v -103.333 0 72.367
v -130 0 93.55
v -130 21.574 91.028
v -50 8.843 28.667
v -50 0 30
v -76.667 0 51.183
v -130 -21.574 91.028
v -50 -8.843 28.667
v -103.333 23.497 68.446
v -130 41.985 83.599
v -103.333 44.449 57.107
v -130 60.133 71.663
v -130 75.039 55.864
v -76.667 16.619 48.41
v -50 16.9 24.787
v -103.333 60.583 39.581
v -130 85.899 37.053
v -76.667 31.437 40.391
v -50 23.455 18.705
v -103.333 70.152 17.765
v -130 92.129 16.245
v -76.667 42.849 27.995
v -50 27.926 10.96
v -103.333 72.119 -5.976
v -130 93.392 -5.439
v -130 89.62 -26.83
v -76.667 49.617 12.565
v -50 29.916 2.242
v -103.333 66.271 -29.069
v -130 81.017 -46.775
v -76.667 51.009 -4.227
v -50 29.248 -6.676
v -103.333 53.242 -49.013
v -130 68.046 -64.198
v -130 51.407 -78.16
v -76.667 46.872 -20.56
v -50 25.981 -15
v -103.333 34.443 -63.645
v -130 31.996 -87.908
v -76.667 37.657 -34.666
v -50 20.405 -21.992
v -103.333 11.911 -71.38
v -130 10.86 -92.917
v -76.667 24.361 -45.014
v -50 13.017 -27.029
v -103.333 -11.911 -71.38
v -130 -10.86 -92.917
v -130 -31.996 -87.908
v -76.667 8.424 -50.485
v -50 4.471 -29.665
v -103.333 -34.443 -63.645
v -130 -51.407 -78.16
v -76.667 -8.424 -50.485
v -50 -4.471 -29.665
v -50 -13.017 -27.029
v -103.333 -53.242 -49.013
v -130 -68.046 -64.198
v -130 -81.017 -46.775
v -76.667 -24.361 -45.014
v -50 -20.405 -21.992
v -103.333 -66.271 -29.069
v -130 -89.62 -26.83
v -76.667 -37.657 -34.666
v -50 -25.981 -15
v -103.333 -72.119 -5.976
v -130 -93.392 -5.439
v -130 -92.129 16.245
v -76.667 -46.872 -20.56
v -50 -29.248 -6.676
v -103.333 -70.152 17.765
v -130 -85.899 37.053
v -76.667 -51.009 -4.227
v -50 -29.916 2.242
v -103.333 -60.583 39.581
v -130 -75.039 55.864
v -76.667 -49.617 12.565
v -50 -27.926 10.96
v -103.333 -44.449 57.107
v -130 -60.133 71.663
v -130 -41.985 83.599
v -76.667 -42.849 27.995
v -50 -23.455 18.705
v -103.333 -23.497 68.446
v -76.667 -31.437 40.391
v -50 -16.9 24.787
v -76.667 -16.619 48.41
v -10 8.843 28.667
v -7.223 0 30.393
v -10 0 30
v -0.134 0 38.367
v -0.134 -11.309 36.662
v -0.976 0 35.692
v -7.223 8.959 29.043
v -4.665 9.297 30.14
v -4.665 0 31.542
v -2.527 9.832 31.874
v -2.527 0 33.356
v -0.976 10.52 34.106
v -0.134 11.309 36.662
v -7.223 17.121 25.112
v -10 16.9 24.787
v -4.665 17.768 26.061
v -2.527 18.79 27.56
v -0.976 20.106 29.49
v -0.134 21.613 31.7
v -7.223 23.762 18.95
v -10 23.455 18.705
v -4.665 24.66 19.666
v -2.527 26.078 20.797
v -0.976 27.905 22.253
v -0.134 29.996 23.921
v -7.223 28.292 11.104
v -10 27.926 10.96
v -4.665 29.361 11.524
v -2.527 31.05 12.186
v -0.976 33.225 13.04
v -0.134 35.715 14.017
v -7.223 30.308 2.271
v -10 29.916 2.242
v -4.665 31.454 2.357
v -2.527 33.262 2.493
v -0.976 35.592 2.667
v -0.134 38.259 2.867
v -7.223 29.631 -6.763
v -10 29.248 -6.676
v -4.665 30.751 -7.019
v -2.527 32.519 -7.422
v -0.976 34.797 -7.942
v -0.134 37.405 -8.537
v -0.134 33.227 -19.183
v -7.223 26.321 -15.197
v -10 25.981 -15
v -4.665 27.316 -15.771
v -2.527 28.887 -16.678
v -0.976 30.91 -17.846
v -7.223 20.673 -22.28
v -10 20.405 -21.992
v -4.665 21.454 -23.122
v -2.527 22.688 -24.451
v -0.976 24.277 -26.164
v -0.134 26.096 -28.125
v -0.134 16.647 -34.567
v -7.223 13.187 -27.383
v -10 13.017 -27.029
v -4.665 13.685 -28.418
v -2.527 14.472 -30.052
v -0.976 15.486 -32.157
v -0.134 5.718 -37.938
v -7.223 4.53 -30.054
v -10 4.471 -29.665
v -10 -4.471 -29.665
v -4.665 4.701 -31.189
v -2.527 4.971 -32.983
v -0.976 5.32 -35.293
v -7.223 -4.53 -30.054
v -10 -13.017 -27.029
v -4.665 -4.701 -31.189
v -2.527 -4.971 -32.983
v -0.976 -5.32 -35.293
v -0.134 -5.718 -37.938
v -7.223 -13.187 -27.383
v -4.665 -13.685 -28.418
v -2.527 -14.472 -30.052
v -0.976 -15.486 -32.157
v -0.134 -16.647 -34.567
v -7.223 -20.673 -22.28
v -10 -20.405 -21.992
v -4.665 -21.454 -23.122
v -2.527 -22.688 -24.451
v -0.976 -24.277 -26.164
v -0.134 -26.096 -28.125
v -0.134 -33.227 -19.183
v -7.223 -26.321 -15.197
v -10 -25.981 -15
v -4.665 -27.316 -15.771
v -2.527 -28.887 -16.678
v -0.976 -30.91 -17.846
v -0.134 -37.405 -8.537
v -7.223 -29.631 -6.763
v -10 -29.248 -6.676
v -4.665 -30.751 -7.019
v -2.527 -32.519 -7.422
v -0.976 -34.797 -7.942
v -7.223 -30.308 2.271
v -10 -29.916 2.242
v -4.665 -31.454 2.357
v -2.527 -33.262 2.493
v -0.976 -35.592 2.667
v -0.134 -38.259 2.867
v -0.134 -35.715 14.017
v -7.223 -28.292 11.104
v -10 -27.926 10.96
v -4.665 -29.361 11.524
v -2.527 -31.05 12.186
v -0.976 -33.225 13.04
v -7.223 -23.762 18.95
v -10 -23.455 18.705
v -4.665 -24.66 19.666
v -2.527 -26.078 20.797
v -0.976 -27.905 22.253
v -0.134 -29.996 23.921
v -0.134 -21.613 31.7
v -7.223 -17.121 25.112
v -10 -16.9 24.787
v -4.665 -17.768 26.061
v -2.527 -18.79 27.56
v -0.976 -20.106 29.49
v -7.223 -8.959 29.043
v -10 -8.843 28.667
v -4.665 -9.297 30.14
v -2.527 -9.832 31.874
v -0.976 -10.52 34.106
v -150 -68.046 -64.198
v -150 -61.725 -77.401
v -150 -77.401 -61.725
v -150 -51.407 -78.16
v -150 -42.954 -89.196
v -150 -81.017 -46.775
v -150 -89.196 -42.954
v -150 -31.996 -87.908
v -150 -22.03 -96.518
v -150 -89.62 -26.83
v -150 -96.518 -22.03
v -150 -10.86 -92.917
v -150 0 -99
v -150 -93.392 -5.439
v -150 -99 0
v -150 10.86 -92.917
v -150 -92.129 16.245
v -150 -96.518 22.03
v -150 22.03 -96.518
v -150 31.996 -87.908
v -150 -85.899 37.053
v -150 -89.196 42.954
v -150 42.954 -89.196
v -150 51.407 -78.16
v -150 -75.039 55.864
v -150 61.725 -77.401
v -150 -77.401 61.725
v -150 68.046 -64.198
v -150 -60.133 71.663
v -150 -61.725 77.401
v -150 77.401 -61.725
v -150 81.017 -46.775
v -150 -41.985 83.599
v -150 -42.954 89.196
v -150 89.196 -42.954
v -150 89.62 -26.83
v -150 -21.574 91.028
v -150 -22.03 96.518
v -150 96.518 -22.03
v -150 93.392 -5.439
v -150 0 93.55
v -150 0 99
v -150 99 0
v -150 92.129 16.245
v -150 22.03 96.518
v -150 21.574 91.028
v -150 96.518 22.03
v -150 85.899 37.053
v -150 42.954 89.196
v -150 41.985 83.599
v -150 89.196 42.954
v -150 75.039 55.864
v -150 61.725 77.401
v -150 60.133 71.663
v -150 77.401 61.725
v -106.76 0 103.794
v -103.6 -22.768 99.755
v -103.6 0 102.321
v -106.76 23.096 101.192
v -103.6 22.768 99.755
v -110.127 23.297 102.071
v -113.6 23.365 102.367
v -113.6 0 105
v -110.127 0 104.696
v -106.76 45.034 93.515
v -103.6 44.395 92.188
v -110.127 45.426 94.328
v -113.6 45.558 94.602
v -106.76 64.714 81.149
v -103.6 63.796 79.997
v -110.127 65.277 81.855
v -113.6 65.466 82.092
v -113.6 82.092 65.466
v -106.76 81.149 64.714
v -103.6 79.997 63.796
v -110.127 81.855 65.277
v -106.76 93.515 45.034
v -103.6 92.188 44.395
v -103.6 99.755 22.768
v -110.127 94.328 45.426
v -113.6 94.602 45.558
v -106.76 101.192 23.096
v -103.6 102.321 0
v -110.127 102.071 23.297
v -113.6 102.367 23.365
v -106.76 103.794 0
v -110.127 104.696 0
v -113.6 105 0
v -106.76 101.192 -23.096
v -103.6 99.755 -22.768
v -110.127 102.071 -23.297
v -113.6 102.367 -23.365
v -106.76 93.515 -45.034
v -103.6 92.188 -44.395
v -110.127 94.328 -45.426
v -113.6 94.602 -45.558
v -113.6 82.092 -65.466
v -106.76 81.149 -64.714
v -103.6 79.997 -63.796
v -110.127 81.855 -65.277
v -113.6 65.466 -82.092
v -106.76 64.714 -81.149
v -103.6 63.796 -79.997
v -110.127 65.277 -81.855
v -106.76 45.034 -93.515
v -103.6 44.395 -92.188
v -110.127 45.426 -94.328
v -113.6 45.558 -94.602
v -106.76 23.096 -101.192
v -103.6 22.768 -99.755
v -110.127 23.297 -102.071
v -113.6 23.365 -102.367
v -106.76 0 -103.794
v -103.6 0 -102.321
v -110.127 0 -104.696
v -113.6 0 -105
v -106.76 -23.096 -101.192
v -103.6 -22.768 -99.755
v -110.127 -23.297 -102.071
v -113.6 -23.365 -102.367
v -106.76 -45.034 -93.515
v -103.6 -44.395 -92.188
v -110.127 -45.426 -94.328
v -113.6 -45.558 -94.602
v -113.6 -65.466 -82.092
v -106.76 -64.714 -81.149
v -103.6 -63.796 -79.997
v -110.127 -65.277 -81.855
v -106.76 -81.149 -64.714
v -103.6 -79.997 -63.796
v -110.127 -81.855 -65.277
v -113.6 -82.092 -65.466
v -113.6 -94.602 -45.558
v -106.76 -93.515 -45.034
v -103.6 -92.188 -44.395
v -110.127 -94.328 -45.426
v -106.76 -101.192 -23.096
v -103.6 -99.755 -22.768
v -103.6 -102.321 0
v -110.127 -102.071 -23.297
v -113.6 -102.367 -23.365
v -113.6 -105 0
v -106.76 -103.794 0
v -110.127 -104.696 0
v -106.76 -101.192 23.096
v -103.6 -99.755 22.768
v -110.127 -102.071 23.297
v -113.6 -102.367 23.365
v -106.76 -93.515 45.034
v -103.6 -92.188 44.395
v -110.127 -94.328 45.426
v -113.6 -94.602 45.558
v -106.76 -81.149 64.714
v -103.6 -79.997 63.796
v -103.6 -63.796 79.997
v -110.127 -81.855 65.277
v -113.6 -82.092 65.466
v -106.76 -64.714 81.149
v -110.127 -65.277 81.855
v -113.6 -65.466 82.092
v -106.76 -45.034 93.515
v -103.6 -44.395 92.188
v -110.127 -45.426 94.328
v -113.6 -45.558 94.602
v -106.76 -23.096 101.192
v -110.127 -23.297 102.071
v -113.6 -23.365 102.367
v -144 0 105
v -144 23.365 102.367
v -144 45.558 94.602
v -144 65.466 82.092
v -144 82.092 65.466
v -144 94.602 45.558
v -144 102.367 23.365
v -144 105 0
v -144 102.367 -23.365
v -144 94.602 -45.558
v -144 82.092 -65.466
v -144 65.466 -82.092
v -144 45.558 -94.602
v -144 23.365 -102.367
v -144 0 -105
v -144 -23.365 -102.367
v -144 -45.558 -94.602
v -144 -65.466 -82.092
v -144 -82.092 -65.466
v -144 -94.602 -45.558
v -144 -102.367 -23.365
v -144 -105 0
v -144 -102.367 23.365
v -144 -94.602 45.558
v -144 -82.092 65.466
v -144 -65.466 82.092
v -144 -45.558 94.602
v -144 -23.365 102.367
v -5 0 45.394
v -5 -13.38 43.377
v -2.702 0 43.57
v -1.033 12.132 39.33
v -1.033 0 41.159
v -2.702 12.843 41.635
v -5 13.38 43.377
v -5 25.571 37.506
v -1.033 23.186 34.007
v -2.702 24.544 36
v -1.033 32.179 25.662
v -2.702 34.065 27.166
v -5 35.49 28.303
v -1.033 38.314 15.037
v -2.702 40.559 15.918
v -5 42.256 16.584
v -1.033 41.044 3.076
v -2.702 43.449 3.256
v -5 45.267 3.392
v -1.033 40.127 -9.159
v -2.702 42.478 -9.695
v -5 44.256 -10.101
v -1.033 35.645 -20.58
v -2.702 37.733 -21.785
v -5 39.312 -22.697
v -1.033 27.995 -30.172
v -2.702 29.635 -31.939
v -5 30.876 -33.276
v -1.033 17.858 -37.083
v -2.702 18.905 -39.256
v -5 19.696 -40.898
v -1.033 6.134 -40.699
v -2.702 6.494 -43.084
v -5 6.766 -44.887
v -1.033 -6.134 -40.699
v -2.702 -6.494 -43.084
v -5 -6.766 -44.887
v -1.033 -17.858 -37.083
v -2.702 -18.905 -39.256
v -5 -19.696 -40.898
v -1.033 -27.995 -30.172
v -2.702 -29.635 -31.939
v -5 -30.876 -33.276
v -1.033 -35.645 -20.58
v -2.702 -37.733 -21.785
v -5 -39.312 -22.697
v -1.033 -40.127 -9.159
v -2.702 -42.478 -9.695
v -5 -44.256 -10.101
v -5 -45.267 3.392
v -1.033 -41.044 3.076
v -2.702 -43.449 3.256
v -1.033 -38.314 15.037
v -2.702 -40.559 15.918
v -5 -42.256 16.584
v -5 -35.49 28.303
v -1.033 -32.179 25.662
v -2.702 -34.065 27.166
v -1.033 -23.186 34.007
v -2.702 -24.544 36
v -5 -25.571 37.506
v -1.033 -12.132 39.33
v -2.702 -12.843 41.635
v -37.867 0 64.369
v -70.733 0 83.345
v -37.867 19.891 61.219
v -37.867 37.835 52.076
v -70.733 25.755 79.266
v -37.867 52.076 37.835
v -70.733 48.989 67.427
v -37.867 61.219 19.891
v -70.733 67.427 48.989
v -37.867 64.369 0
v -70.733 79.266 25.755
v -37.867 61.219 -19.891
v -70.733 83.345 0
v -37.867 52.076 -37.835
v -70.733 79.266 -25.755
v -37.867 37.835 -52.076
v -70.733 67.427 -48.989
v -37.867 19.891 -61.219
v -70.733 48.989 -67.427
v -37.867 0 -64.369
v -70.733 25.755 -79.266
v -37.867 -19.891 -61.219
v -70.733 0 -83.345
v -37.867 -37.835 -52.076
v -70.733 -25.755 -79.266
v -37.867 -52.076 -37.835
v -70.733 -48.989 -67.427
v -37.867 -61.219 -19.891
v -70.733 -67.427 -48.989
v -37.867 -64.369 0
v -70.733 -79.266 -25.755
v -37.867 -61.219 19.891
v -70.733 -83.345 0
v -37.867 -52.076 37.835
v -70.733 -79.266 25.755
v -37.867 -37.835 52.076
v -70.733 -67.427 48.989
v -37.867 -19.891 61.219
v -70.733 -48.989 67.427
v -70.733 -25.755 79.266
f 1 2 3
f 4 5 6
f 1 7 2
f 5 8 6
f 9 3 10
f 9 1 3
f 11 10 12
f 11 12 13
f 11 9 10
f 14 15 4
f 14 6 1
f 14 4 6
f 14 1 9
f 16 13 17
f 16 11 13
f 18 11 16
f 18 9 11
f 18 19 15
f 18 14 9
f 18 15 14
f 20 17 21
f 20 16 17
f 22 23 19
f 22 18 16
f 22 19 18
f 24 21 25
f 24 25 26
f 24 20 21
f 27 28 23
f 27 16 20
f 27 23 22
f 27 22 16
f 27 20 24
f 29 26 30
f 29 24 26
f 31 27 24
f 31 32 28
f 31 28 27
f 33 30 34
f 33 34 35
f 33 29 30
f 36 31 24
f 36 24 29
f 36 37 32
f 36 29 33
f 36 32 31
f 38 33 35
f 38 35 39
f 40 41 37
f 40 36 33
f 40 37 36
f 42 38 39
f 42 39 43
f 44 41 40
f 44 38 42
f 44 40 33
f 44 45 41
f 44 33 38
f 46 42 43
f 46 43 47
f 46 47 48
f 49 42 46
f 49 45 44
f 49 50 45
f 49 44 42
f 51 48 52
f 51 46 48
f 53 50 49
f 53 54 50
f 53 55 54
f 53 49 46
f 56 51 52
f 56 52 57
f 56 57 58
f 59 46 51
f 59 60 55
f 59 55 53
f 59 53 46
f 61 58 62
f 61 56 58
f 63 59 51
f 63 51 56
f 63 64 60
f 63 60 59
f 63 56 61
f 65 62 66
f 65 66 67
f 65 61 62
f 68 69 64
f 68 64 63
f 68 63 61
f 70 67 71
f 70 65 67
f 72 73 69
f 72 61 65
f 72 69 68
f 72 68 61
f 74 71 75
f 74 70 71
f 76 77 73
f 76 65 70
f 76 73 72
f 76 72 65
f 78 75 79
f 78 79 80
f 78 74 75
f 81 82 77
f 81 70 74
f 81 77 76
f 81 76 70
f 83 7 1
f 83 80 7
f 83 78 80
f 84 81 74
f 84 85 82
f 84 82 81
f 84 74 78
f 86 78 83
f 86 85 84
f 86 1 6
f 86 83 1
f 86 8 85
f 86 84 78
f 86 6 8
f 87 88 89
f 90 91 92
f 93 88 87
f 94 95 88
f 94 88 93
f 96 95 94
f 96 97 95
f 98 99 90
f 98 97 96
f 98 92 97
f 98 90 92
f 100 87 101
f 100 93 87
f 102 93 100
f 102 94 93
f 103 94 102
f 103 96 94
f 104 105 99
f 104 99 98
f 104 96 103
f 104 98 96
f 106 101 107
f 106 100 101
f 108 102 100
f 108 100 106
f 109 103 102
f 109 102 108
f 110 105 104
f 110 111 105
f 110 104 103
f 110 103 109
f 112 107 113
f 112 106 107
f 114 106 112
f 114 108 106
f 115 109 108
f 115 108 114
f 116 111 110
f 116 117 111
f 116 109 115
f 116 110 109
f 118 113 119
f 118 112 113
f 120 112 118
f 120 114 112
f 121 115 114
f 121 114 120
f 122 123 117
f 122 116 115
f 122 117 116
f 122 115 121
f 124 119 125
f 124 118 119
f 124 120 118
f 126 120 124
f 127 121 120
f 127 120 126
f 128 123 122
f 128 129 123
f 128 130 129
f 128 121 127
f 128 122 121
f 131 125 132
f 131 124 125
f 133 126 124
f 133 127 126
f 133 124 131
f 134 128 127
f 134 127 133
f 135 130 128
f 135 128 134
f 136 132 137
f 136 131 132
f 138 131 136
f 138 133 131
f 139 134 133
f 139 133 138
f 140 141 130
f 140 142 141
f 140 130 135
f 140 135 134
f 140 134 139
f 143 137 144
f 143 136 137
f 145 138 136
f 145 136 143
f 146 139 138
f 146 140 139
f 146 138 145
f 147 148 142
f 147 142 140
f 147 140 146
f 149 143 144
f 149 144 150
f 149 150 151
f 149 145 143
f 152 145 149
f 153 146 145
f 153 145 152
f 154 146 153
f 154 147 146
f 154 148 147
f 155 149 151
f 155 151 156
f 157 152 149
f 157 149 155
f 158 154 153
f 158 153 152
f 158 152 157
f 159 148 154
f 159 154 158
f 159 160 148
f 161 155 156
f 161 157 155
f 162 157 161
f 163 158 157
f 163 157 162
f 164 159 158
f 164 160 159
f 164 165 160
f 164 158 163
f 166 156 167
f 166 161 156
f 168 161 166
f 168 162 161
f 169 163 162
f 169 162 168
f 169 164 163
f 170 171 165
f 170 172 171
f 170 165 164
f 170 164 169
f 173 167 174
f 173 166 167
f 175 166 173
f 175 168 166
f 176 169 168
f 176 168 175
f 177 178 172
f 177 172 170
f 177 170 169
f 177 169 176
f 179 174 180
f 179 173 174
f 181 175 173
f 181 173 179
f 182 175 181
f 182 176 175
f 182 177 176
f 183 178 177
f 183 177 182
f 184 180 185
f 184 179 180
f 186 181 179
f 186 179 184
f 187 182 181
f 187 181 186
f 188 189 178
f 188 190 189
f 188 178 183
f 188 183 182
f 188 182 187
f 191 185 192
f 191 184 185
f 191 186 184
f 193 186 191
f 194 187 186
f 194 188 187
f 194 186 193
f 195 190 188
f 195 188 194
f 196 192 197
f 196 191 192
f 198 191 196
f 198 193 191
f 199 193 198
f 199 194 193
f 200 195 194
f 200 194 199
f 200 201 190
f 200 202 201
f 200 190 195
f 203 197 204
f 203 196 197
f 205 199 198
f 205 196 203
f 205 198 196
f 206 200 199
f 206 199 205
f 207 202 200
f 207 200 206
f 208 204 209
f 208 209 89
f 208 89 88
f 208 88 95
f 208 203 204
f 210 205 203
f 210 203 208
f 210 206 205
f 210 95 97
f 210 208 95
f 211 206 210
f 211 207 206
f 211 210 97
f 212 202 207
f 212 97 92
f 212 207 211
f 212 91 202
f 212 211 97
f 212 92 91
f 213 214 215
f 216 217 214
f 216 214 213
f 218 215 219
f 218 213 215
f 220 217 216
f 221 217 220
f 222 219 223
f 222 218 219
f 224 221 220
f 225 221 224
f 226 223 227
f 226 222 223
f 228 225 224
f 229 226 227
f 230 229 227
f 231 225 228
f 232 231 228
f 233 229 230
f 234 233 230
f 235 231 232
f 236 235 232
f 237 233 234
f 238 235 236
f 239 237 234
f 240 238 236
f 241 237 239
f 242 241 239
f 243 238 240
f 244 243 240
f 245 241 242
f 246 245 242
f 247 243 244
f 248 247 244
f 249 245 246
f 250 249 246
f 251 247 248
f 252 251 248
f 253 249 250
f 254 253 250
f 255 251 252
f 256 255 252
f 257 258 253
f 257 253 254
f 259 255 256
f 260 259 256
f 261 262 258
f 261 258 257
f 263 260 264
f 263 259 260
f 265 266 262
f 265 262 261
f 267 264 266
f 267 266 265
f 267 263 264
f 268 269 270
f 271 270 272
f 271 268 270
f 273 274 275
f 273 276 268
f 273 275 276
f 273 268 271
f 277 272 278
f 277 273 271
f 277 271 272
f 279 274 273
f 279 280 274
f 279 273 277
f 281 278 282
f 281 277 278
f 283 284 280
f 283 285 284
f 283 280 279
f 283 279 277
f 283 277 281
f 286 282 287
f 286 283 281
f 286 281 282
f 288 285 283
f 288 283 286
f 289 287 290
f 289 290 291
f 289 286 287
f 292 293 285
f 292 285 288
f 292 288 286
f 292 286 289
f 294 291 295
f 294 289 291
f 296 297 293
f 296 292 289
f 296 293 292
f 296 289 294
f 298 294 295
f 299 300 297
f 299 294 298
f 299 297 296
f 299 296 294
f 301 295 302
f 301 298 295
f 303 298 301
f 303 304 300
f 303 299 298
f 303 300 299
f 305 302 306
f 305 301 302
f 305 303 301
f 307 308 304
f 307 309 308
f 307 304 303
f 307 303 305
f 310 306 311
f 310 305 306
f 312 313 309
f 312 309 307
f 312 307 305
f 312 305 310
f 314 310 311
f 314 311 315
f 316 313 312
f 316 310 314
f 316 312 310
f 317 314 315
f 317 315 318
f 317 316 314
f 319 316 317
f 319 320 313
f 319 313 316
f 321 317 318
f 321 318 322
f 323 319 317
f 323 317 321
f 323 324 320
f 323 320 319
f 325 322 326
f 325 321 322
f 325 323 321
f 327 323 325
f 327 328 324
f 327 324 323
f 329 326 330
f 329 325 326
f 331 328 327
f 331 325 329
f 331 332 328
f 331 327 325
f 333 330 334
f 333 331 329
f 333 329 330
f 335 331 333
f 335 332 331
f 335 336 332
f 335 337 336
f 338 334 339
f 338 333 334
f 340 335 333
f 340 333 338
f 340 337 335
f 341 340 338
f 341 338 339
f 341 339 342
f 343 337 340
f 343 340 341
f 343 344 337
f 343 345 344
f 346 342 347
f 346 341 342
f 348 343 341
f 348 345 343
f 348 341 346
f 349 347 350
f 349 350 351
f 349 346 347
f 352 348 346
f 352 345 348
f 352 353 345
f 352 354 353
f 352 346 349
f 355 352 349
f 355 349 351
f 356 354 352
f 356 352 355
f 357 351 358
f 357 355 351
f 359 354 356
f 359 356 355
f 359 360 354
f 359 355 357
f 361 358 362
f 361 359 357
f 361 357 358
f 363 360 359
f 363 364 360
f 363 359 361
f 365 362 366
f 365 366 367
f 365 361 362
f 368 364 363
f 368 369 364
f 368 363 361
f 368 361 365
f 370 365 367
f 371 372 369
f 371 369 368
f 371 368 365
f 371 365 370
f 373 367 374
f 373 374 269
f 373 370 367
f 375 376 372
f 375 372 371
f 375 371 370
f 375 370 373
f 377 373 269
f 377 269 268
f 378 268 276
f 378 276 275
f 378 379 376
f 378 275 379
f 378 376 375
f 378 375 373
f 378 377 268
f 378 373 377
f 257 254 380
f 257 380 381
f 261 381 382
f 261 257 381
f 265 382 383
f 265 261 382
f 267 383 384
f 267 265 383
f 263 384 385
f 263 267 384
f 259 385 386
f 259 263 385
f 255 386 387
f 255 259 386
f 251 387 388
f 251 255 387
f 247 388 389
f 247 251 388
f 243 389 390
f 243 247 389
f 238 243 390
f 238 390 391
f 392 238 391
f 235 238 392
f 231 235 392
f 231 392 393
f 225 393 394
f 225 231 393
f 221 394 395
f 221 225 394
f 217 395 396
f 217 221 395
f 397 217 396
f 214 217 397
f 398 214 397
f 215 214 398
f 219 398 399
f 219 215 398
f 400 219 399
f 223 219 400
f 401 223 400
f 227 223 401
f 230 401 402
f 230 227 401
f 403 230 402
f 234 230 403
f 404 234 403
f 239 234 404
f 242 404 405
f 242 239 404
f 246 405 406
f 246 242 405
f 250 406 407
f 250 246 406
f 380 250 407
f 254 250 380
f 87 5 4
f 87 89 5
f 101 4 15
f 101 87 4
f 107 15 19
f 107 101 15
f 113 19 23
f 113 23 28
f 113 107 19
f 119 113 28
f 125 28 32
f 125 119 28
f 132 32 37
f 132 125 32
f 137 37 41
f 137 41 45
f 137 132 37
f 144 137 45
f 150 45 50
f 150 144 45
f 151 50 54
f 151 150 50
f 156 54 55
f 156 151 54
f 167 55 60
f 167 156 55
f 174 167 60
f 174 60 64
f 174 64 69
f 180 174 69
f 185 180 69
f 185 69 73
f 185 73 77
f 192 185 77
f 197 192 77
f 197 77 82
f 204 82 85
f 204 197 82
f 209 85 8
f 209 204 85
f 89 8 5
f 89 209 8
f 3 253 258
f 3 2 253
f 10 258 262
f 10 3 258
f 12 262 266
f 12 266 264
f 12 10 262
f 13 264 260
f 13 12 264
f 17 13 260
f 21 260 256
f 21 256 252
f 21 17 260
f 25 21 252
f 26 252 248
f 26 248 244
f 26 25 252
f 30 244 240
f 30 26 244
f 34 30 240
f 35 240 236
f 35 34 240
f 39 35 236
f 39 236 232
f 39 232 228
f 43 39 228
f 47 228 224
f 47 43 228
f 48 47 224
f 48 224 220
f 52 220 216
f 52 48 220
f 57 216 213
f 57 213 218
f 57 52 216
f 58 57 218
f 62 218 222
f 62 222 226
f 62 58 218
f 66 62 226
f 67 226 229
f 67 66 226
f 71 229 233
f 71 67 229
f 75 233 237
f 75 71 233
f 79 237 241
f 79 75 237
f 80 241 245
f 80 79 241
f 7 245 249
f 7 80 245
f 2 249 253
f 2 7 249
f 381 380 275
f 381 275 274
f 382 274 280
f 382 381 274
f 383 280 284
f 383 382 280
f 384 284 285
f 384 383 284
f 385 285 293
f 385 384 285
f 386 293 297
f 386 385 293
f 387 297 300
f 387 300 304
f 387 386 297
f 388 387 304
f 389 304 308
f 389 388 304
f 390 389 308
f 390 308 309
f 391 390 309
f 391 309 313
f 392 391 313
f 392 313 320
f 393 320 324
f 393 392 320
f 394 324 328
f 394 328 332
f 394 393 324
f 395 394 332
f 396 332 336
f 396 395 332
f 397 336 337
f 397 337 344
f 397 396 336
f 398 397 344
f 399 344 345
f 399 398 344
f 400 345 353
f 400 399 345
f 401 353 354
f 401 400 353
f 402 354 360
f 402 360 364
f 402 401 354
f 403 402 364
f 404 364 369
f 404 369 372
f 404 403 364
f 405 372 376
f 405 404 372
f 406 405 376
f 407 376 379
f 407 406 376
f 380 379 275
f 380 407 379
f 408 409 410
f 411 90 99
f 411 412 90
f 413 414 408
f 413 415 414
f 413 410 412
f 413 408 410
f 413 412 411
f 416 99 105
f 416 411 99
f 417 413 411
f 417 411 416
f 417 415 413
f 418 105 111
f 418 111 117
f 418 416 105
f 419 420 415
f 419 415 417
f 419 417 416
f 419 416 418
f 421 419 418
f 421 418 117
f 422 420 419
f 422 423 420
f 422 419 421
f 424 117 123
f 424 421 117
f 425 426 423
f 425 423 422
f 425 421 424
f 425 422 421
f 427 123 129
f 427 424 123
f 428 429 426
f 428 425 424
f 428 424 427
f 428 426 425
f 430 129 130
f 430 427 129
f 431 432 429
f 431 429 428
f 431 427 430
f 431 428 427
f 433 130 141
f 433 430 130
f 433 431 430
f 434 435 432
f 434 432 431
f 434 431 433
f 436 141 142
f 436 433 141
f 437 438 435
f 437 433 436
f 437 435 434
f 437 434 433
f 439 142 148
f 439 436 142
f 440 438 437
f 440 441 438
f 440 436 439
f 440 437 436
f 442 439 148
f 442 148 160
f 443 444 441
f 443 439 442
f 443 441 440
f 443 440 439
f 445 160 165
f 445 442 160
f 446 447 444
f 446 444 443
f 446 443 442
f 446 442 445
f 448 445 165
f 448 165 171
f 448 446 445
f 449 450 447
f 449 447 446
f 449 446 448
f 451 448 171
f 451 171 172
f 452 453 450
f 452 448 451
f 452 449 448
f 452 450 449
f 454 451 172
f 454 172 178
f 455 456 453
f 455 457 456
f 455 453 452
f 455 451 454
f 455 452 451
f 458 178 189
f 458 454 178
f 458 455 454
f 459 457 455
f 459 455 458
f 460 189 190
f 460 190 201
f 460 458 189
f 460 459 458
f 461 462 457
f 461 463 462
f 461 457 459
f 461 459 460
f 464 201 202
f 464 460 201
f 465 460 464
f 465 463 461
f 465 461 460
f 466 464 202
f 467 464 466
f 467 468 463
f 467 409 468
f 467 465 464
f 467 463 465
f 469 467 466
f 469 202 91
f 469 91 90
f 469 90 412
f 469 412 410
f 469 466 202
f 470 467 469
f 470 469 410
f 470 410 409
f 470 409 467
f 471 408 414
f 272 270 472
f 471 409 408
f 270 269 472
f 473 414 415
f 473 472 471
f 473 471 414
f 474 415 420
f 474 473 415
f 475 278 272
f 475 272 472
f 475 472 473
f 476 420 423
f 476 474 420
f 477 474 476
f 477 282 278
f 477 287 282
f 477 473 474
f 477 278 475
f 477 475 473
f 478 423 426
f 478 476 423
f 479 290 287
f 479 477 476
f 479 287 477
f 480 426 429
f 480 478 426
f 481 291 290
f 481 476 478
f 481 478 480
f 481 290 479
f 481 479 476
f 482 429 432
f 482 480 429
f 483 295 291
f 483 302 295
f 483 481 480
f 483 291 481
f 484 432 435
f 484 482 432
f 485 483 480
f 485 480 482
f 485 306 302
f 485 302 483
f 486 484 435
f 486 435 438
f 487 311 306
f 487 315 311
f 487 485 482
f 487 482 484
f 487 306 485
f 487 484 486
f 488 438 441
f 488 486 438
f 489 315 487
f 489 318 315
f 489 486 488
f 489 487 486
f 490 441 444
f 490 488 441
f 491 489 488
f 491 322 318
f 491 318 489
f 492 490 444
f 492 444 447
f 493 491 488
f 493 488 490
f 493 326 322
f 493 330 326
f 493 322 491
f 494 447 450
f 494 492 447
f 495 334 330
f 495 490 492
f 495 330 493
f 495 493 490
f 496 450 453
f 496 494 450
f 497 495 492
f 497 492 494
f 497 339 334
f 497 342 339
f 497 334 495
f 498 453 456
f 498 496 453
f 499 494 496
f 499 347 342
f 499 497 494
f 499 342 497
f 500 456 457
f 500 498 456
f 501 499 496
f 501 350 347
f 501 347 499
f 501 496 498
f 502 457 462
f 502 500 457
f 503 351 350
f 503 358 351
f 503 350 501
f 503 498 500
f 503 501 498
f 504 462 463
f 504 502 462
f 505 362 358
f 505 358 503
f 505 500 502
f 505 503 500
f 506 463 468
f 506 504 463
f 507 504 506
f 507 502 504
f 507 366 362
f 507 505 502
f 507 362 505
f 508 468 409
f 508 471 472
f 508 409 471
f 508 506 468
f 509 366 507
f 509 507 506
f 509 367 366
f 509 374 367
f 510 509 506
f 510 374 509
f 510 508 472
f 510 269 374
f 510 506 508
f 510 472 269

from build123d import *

# Parameters (mm, degrees)
F2_SIZE = 6


with BuildPart() as f1:
    # F0 (on Front) → F1 (revolve)
    with BuildSketch(Plane.XZ):
        with BuildLine():
            ThreePointArc((-103.6, 102.320508), (-108.423619, 104.318517), (-113.6, 105))
            Line((-113.6, 105), (-150, 105))
            Line((-150, 105), (-150, 93.55))
            Line((-150, 93.55), (-130, 93.55))
            Line((-130, 93.55), (-50, 30))
            Line((-50, 30), (-10, 30))
            ThreePointArc((-10, 30), (-3.532095, 32.373323), (-0.134275, 38.366759))
            ThreePointArc((-0.134275, 38.366759), (-1.778554, 42.426305), (-5, 45.393772))
            Line((-5, 45.393772), (-103.6, 102.320508))
        make_face()
    revolve(axis=Axis((-75, 0, 0), (-1, 0, 0)))

    # F2
    f2_edges = [f1.edges().sort_by_distance(p)[0] for p in [
        (-150, 0, -105),
    ]]
    chamfer(f2_edges, length=F2_SIZE)


solid = f1.part
